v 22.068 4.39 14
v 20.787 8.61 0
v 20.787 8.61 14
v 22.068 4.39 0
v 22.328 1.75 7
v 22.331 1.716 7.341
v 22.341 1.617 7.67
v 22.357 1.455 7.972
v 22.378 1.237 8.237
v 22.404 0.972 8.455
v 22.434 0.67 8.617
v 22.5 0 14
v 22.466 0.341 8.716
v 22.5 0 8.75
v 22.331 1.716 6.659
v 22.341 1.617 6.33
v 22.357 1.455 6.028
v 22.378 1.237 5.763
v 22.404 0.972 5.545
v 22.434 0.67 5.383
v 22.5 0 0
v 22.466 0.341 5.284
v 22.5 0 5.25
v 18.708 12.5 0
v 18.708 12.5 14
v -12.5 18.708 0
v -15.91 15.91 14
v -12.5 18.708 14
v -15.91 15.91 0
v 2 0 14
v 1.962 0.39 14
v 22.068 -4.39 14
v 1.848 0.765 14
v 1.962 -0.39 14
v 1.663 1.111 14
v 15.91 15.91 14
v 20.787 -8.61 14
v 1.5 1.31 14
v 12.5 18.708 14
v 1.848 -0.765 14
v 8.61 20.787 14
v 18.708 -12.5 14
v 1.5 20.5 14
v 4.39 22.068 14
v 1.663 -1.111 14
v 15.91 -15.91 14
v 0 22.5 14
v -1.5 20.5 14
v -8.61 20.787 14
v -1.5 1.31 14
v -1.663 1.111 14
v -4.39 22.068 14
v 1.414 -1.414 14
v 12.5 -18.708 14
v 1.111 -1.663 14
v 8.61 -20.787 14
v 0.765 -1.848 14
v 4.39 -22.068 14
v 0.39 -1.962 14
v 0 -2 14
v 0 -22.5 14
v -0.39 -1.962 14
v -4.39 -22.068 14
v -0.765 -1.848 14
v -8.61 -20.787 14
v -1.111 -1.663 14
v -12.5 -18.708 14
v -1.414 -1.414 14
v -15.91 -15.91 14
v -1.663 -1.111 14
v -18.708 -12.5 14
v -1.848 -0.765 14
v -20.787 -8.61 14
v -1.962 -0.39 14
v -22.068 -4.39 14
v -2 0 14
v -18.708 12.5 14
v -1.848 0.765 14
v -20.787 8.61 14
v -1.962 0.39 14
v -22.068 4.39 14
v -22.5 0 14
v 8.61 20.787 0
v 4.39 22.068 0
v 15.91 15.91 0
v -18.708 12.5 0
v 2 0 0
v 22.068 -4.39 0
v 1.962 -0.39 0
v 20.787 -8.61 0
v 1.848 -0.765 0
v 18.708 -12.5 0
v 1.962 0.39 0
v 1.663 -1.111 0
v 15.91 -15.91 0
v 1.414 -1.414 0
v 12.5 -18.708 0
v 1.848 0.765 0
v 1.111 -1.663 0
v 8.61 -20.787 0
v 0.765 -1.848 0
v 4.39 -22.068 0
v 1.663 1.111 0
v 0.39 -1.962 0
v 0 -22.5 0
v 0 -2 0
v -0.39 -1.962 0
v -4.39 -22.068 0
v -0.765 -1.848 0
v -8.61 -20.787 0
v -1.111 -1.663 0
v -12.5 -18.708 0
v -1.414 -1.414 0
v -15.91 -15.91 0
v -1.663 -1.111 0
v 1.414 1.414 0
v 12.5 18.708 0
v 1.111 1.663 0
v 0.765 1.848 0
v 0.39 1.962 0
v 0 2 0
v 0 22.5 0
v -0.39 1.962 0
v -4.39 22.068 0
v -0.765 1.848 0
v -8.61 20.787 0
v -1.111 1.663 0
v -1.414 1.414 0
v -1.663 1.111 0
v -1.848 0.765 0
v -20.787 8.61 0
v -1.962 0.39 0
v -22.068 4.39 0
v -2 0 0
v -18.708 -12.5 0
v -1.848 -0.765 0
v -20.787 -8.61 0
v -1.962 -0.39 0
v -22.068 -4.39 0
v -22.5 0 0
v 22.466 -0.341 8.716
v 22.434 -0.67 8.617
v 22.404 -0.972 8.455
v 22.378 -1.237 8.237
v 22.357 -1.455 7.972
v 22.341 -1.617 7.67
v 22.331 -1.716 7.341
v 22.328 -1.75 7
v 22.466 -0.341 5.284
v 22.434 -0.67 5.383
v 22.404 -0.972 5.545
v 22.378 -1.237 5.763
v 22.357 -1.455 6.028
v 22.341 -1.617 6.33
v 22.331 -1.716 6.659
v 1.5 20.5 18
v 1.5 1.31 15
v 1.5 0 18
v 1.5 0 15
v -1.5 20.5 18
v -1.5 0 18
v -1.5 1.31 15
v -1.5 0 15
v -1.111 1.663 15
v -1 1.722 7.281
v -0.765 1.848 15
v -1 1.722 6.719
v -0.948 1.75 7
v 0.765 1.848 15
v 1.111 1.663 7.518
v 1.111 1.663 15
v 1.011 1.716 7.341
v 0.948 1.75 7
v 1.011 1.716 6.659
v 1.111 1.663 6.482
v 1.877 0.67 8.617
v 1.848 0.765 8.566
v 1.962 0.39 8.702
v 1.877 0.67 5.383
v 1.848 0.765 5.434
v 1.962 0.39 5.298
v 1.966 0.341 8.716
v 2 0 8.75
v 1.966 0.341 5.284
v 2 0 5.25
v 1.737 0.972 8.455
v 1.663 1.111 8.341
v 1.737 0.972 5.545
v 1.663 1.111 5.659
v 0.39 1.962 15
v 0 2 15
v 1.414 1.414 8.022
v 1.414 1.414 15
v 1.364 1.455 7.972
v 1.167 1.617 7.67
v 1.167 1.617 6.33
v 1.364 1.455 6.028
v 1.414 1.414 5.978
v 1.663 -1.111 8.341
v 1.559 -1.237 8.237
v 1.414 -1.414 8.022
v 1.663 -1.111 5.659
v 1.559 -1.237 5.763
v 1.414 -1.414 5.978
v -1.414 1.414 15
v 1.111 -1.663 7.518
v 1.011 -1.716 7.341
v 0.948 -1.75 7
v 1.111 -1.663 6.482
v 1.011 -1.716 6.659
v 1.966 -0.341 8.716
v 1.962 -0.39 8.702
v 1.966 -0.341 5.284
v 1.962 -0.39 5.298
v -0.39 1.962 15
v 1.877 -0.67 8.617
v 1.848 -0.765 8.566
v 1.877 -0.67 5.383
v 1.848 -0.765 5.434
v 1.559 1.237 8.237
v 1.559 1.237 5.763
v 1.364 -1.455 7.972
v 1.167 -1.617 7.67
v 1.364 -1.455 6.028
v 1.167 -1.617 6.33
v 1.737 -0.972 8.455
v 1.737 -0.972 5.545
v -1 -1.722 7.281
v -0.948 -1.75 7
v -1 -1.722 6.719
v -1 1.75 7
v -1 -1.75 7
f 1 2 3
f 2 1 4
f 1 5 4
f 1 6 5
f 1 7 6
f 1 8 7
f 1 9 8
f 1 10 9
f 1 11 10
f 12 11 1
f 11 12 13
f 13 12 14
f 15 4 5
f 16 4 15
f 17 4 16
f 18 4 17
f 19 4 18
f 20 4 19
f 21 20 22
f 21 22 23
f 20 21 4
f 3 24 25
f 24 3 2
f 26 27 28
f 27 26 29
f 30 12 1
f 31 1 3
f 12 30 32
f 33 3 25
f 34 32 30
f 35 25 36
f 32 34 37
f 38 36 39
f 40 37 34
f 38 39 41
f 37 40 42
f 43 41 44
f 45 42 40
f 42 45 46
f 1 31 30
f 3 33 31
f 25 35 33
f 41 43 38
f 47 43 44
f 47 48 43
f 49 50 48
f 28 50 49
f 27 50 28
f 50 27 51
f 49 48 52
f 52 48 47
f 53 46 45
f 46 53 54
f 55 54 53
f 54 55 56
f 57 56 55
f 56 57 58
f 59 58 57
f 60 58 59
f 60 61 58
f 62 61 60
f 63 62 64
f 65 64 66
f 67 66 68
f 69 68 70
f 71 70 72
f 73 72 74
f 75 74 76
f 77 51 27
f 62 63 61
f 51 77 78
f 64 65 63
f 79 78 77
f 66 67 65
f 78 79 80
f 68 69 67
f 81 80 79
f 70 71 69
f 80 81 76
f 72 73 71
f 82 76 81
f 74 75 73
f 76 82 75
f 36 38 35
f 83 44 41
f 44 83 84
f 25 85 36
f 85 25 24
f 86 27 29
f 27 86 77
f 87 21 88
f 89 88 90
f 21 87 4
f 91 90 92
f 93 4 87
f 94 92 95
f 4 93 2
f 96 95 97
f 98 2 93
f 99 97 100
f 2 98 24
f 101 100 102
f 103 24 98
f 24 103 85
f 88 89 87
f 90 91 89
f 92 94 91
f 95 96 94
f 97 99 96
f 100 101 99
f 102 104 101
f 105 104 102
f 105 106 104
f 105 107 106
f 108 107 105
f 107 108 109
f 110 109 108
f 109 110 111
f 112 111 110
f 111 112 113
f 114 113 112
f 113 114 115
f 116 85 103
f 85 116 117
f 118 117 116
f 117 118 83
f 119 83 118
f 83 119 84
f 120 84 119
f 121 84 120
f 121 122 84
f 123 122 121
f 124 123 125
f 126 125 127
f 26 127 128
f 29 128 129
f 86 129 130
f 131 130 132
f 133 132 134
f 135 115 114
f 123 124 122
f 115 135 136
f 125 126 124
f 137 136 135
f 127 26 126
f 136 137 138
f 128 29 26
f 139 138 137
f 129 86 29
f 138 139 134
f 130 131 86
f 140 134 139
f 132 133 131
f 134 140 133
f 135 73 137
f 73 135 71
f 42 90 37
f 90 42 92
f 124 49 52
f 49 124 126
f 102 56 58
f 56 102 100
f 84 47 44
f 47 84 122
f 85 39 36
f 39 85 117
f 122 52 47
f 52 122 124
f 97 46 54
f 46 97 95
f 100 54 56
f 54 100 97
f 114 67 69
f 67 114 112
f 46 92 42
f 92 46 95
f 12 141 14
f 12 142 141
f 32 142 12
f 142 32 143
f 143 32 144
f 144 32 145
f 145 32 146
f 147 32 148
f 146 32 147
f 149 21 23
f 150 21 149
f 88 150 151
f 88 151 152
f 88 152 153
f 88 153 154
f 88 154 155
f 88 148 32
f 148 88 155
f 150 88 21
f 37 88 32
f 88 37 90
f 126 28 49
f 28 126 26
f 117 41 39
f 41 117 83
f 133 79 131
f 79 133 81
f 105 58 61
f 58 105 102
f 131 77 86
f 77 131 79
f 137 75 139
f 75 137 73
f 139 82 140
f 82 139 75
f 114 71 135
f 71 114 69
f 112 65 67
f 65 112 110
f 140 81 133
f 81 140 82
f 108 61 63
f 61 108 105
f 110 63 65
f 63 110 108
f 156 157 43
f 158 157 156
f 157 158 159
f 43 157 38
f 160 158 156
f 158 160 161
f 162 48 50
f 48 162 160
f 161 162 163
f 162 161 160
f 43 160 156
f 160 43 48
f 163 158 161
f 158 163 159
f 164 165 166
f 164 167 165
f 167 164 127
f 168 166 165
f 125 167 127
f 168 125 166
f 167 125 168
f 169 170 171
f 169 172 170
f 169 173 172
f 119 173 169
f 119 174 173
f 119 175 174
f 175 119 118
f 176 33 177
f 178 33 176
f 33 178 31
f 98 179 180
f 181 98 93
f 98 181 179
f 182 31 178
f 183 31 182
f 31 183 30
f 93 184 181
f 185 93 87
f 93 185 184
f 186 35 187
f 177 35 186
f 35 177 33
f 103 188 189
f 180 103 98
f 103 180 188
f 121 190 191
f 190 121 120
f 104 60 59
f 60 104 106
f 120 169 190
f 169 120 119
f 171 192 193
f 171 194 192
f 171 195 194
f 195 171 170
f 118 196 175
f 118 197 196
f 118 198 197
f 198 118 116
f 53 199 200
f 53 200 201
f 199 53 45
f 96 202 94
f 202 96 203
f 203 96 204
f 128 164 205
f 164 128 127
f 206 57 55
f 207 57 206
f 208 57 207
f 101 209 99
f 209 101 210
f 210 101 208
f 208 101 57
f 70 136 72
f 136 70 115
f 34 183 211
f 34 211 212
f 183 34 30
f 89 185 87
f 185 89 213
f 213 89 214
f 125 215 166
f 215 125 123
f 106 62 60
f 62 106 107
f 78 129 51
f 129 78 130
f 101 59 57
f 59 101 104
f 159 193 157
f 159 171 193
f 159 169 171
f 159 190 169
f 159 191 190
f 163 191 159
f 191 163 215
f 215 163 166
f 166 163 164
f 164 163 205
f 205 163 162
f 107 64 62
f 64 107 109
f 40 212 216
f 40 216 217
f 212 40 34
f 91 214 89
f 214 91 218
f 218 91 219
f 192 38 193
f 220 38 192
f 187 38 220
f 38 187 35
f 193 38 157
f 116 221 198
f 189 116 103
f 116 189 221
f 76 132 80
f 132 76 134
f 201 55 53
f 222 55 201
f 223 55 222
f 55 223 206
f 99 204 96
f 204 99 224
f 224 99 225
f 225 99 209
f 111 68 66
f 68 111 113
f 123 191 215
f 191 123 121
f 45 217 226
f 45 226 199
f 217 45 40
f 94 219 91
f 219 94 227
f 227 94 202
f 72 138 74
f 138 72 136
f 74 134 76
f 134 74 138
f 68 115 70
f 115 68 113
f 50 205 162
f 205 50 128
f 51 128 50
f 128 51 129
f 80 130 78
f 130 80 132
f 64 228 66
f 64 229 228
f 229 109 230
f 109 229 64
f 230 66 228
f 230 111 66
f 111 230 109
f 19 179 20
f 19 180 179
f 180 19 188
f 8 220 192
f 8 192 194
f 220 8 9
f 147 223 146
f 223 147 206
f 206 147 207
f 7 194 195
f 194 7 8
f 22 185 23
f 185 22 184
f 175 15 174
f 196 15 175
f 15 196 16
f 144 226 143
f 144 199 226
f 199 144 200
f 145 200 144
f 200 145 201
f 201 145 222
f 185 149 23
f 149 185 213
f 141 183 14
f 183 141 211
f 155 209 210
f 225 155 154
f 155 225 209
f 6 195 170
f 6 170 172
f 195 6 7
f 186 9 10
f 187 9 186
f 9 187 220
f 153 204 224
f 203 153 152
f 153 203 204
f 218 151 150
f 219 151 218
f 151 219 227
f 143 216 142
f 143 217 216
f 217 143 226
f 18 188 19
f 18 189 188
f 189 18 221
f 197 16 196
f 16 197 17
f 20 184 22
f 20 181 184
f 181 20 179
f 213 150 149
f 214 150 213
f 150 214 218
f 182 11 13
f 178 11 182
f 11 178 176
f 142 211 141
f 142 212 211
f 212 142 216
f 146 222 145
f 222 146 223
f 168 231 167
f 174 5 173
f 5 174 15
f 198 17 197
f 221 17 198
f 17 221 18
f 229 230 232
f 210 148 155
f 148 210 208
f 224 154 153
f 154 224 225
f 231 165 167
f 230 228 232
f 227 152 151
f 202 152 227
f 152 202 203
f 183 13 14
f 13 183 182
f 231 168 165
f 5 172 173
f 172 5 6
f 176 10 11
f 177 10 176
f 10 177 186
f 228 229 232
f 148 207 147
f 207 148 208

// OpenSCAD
$fn = 32;

// ----------------------------------------------------------------------
// Control knob: pointer knob
// ----------------------------------------------------------------------

// --- parameters (mm) ---
rib_w = 3;                // pointer rib width
rib_h = 5;                // pointer rib height
knob_d = 45;              // knob body diameter
knob_h = 14;              // knob body height
bore_d = 4;               // shaft bore diameter
set_d = 3.5;              // set screw bore diameter

rib_poke = rib_h - 1;  // rib height above the top
total_h = knob_h + rib_h - 1;  // overall height

difference() {
  union() {
    cylinder(h = knob_h, d = knob_d);
    translate([-rib_w / 2, 0, knob_h - 1])
      cube([rib_w, knob_d / 2 - 2, rib_h]);
  }
  translate([0, 0, -1]) cylinder(h = knob_h + 2, d = bore_d);
  translate([-1, 0, knob_h / 2]) rotate([0, 90, 0])
    cylinder(h = knob_d / 2 + bore_d / 2 + 2, d = set_d);}
